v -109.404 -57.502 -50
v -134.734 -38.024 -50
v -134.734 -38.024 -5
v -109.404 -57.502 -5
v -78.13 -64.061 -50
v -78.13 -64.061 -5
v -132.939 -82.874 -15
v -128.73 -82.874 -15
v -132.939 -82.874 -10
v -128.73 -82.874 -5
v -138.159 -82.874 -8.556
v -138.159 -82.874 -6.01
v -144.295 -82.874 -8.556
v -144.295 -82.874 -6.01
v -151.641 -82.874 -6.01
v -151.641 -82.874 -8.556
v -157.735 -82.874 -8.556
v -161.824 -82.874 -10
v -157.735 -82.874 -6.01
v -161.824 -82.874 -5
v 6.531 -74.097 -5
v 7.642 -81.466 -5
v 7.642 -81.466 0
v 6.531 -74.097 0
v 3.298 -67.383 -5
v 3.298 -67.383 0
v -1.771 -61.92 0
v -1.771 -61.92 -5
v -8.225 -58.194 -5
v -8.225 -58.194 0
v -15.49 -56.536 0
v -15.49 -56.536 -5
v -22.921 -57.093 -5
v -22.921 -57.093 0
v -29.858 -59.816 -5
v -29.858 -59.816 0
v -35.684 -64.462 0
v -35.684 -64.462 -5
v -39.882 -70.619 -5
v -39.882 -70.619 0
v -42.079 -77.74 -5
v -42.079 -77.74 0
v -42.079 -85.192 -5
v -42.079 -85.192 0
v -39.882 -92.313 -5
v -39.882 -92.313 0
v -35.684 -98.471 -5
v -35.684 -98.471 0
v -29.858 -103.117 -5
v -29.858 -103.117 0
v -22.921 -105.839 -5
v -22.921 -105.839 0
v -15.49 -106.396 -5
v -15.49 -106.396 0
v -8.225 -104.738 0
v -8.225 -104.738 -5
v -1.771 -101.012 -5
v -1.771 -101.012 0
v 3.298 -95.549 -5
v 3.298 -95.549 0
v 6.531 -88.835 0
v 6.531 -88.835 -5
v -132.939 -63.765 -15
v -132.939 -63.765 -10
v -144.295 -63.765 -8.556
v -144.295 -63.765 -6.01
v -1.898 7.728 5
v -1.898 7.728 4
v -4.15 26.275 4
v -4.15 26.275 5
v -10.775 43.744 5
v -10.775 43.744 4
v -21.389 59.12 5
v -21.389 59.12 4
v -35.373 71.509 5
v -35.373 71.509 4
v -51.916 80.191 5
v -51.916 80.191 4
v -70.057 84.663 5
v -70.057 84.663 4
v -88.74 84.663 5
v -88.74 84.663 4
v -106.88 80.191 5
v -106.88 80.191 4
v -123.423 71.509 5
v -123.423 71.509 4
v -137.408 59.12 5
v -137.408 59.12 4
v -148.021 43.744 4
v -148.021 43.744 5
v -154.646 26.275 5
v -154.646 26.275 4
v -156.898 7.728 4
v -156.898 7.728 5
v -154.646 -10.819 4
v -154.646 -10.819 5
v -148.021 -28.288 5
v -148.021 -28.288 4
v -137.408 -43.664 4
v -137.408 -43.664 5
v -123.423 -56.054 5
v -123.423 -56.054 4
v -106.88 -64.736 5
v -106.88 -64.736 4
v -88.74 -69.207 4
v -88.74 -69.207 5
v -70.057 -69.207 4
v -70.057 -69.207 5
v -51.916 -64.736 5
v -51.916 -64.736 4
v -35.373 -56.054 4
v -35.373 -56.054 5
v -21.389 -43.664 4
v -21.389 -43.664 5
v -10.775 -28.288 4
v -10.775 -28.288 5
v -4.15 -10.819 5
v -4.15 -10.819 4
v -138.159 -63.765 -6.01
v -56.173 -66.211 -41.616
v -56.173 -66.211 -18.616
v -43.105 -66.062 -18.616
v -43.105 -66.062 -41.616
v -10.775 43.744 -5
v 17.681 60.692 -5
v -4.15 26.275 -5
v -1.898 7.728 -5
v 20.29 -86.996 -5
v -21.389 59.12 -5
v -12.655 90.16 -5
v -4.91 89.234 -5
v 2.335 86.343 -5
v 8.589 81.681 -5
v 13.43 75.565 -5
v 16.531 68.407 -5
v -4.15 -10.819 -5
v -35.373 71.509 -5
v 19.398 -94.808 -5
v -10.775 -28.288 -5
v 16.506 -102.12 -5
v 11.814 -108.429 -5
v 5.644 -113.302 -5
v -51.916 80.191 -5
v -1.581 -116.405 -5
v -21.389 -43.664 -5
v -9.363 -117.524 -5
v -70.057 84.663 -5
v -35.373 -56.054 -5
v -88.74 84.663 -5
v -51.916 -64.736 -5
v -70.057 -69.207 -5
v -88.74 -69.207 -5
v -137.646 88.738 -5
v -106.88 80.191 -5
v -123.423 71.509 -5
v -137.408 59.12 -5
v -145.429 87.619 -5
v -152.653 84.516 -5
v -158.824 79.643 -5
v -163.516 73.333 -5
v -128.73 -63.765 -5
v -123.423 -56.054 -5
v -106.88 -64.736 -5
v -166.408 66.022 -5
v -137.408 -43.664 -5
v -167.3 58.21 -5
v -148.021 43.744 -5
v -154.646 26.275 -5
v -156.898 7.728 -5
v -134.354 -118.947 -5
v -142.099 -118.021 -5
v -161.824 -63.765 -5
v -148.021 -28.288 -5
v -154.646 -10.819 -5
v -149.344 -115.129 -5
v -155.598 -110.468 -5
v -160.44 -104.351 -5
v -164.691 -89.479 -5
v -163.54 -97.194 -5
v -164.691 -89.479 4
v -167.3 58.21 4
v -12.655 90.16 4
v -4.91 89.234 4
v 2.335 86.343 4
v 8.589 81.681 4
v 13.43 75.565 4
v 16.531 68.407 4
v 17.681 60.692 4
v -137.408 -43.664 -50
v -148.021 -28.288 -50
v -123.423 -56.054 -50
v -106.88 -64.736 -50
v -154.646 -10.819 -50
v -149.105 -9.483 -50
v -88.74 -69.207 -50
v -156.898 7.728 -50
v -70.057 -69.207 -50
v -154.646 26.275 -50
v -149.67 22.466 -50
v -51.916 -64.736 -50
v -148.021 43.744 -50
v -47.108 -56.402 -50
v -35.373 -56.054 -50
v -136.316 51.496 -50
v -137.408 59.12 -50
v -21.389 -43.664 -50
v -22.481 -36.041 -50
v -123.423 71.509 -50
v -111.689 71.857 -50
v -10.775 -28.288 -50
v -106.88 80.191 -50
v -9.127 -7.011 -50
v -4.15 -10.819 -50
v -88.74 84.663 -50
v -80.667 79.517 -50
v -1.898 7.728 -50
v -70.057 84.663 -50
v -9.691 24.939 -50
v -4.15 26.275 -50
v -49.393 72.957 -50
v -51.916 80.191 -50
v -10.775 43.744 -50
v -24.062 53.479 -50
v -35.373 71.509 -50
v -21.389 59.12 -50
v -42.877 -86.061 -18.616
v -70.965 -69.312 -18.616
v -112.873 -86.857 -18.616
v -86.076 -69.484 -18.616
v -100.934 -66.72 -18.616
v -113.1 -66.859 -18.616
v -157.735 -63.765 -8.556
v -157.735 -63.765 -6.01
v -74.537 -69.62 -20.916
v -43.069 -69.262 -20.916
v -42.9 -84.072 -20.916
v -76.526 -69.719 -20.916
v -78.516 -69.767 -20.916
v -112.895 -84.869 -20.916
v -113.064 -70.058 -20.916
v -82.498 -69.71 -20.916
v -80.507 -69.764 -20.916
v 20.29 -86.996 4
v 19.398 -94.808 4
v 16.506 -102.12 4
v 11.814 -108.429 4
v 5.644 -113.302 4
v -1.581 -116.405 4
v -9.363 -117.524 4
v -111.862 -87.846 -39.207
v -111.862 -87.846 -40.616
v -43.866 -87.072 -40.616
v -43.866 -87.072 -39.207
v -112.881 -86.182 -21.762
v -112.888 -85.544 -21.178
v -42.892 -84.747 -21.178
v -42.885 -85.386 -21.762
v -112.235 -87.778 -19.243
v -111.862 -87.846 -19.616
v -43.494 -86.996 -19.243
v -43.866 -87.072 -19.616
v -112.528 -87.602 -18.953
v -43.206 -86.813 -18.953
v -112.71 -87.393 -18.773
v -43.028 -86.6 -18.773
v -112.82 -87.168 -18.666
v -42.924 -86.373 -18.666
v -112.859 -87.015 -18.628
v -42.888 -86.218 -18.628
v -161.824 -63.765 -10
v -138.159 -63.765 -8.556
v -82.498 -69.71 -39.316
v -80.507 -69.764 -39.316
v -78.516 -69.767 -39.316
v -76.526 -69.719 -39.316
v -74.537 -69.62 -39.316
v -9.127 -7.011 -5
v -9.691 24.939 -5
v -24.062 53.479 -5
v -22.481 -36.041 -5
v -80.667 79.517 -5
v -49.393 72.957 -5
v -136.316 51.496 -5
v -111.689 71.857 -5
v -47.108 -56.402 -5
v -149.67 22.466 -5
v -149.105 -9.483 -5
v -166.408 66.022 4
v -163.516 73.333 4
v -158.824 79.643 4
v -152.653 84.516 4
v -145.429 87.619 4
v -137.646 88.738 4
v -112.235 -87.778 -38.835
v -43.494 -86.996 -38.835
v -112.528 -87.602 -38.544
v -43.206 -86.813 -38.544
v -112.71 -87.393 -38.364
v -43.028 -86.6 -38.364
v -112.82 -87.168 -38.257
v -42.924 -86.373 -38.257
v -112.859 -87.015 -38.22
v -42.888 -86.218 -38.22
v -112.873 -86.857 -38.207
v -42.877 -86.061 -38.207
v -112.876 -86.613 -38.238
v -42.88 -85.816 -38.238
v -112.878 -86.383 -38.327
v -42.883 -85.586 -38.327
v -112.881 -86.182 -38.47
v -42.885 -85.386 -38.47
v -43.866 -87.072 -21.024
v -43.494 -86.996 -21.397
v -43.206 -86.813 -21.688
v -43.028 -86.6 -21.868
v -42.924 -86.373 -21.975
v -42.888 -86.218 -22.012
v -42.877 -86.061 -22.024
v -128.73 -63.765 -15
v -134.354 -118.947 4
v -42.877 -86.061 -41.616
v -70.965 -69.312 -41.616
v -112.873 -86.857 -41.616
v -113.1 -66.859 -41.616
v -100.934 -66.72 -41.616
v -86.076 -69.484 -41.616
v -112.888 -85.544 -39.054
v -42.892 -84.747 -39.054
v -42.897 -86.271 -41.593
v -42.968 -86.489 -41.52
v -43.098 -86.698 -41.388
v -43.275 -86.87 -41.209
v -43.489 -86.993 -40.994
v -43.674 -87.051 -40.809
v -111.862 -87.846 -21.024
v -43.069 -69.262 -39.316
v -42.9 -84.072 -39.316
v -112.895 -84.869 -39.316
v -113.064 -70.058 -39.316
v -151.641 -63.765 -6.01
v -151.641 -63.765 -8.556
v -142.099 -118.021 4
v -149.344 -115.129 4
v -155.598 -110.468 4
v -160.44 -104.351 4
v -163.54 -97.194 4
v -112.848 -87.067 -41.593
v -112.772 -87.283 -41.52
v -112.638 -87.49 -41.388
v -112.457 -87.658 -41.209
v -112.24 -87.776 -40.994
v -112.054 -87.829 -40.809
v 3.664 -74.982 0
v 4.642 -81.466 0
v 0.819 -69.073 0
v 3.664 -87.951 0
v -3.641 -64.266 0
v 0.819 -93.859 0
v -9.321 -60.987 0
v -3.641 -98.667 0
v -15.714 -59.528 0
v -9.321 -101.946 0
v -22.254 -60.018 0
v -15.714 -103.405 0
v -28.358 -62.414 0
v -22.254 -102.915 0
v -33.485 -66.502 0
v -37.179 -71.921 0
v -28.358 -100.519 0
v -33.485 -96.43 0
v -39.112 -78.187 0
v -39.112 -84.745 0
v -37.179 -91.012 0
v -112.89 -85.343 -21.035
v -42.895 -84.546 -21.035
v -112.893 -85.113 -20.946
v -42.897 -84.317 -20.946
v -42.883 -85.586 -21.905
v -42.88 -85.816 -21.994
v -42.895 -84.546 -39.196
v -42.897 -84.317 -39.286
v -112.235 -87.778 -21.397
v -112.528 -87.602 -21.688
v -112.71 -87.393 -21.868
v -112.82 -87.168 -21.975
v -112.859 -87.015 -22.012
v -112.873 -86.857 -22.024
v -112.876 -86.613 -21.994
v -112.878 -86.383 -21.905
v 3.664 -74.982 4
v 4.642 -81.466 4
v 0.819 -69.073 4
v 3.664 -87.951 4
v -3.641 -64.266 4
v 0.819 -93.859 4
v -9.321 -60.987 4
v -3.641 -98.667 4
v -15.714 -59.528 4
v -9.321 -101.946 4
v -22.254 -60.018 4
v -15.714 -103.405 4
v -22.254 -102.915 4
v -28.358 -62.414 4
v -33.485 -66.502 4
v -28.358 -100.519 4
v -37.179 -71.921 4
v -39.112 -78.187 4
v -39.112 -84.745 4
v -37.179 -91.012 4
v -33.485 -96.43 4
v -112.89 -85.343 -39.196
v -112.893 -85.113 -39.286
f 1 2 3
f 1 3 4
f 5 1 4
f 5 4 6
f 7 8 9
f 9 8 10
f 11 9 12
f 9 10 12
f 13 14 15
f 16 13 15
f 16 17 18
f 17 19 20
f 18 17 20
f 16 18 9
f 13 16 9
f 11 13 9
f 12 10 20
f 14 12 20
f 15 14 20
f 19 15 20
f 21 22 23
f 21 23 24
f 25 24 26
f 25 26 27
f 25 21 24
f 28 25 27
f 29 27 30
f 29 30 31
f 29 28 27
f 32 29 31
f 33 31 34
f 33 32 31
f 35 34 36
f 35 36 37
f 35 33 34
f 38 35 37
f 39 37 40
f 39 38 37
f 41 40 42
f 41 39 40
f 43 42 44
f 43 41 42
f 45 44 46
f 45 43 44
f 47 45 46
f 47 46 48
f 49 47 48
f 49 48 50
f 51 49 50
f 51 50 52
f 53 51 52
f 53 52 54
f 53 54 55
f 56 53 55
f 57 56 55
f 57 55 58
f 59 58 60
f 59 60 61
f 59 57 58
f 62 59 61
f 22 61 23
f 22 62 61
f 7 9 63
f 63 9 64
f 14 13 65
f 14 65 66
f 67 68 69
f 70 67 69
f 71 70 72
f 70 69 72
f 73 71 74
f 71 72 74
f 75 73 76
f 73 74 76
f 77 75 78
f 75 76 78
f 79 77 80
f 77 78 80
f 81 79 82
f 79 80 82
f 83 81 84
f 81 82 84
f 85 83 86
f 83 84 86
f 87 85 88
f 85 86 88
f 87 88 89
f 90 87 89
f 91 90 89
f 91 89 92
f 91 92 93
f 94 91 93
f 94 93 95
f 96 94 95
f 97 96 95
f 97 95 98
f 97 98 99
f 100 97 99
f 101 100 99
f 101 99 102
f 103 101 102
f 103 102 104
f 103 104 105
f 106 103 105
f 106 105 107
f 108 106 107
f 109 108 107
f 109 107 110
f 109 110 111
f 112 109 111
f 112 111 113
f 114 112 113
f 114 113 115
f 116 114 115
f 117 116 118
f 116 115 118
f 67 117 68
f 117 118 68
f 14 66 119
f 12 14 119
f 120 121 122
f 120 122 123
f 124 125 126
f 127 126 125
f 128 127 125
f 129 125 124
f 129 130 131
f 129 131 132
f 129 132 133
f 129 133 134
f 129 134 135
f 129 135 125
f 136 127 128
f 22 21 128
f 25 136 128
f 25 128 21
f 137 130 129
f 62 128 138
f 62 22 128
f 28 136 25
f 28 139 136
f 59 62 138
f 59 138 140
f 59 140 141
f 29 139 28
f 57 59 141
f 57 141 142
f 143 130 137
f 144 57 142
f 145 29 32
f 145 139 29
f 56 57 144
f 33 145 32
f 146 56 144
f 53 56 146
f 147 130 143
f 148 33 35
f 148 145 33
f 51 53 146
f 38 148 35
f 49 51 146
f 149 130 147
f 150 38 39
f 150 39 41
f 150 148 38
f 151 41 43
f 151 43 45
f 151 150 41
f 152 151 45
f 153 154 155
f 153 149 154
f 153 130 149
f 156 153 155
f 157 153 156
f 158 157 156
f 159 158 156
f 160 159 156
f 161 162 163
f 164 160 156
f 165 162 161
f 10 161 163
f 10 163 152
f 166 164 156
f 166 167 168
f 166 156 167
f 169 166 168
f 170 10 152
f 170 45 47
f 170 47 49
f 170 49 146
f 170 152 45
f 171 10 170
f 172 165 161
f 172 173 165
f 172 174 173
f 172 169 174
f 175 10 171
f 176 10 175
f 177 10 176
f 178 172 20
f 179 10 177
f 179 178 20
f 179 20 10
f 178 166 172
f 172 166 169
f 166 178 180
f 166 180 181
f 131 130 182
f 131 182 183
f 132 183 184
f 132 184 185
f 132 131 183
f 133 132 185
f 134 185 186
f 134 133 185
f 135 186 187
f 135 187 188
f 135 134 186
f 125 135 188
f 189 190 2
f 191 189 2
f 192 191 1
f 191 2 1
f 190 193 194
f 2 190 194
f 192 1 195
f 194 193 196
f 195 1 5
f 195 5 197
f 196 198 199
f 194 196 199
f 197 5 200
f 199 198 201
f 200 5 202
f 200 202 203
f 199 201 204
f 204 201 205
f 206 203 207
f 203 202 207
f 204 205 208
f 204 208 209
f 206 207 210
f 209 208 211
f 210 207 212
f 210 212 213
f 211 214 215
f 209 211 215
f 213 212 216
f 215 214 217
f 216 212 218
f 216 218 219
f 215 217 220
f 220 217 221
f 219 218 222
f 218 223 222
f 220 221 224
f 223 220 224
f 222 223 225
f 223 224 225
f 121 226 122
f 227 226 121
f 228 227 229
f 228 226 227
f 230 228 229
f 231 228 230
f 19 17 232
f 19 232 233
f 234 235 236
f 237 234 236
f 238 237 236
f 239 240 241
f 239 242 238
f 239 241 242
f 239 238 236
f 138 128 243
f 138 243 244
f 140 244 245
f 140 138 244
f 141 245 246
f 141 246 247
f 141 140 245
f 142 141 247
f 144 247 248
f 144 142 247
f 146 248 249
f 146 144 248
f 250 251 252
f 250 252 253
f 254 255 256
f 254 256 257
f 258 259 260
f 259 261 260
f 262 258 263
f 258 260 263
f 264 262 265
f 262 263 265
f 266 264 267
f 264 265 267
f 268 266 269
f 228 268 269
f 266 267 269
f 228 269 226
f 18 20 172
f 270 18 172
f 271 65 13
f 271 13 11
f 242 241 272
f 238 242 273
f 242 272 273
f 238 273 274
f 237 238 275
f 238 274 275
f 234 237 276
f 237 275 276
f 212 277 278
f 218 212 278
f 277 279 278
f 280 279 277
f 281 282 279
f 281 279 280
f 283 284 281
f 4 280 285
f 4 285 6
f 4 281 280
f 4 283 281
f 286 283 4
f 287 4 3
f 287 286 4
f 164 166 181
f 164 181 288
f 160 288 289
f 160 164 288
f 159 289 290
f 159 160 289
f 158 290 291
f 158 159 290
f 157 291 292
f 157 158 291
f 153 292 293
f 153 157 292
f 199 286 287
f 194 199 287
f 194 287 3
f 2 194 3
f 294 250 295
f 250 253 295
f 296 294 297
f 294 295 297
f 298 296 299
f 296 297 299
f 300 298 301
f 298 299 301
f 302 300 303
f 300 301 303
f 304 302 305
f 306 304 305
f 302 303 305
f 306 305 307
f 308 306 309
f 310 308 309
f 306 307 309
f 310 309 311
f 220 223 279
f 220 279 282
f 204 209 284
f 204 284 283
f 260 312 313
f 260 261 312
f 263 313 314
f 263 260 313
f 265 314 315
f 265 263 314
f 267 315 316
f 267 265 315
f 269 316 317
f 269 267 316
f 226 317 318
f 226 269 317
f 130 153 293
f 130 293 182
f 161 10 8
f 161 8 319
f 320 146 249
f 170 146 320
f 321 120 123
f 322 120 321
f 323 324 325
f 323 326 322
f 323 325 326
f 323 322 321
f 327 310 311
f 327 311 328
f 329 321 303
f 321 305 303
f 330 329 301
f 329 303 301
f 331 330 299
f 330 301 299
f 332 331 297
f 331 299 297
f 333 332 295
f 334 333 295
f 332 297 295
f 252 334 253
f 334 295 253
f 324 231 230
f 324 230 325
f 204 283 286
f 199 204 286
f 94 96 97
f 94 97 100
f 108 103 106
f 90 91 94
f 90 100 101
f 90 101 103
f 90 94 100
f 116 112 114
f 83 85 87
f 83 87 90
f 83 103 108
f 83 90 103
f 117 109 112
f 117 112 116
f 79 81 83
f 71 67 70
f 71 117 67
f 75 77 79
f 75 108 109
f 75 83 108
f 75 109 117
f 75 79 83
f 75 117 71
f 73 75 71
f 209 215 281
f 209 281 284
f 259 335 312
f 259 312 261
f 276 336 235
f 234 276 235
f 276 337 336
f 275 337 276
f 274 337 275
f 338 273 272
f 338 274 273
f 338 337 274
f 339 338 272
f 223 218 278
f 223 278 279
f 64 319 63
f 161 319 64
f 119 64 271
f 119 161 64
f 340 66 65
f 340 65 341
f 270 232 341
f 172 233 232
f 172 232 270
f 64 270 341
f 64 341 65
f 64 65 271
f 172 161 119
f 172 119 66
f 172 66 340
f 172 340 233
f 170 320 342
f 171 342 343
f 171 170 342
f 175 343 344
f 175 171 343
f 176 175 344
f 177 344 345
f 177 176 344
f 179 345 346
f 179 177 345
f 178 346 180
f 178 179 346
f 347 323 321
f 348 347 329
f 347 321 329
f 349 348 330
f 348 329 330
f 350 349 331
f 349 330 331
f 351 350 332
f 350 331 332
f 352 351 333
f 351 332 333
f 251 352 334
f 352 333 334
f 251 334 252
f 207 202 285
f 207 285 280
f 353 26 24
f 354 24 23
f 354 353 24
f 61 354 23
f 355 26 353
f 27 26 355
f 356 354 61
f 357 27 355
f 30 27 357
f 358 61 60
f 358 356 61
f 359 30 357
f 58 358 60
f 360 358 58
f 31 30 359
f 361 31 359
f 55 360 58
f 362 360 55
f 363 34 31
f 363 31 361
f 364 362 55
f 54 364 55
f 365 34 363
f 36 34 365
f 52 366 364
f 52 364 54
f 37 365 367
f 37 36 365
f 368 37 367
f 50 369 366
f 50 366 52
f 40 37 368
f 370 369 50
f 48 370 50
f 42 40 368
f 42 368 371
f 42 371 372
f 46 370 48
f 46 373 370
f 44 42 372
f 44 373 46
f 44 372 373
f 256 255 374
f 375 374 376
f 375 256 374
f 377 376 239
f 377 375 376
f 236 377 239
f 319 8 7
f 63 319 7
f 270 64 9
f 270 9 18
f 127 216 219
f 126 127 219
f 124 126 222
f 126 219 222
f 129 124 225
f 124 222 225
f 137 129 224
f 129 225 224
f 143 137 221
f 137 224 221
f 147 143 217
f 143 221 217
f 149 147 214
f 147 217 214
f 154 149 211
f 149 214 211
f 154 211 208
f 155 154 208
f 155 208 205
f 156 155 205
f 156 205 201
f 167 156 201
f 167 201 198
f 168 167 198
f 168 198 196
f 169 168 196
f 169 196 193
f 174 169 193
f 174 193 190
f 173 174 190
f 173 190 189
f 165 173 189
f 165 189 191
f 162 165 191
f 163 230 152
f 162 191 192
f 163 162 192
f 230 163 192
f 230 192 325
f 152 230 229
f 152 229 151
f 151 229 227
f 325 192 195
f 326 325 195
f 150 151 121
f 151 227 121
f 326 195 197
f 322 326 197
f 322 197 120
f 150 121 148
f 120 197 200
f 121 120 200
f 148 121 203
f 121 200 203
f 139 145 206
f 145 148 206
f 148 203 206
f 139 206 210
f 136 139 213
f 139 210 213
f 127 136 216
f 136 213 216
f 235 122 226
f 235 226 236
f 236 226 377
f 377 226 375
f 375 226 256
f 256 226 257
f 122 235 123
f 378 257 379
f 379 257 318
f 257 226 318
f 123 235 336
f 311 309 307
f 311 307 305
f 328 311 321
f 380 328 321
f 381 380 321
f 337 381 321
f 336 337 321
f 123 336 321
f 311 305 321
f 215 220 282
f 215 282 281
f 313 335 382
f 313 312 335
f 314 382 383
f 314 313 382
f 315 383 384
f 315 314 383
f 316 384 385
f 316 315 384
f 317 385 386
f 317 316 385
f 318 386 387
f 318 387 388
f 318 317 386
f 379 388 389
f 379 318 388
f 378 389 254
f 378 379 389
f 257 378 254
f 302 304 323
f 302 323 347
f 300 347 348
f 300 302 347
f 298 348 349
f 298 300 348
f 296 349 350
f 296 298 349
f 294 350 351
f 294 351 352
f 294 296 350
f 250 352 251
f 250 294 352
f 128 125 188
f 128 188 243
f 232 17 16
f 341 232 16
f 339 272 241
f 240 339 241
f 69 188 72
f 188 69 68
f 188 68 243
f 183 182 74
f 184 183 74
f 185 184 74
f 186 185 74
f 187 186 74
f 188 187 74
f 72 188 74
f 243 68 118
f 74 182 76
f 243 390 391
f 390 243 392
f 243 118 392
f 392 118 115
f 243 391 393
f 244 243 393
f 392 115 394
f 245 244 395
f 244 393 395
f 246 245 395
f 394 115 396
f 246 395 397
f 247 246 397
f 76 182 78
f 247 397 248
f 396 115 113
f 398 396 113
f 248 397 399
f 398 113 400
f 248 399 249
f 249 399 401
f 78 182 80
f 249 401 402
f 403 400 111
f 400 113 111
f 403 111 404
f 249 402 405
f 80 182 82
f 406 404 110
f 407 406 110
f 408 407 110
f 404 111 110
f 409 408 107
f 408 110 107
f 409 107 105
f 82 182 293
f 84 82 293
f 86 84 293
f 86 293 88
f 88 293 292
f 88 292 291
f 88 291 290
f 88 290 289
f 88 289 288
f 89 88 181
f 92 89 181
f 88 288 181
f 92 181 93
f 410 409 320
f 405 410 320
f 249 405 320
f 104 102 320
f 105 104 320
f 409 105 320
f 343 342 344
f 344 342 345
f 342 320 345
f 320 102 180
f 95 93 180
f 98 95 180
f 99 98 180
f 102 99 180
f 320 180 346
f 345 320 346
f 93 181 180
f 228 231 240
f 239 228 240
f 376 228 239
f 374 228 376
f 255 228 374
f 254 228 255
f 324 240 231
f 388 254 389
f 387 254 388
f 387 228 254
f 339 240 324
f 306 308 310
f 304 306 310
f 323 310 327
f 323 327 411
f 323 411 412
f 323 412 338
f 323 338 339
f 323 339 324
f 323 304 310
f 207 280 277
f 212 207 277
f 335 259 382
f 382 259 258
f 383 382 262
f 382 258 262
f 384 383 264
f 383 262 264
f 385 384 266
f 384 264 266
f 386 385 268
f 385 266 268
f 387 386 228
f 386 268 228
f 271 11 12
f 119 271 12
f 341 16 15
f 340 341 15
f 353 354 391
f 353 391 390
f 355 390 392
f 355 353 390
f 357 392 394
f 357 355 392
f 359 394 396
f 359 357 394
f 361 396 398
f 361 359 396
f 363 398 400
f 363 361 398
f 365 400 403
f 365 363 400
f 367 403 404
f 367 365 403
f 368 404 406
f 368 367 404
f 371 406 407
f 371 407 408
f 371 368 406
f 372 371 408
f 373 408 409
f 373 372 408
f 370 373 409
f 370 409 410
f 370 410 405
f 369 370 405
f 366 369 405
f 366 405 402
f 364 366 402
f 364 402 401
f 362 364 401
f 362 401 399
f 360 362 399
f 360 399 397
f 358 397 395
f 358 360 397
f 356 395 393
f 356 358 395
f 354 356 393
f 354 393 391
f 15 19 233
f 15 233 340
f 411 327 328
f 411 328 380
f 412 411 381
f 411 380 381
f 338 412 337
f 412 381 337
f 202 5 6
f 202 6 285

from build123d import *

# Parameters (mm, degrees)
SKETCH1_R                 = 77.5
SKETCH1_R_2               = 22
BOSS_EXTRUDE1_DEPTH       = 4
BOSS_EXTRUDE2_START       = -5
SKETCH1_4_R               = 25
BOSS_EXTRUDE2_DEPTH       = 5
BOSS_EXTRUDE5_START       = -50
SKETCH1_7_R               = 77.5
BOSS_EXTRUDE5_DEPTH       = 50
BOSS_EXTRUDE11_DEPTH      = 35
BOSS_EXTRUDE11_DEPTH_BACK = 35
FILLET6_R                 = 1
SKETCH1_8_R               = 77.5
BOSS_EXTRUDE12_DEPTH      = 5
SKETCH9_W                 = 28.884835104
SKETCH9_H                 = 19.109753223
BOSS_EXTRUDE15_DEPTH      = 5
SKETCH10_W                = 6.135894163
SKETCH10_H                = 2.546187374
SKETCH10_W_2              = 6.094153386
CUT_EXTRUDE1_DEPTH        = 19.109753223
SKETCH9_9_W               = 4.209300424
SKETCH9_9_H               = 19.109753223
BOSS_EXTRUDE16_DEPTH      = 10


with BuildPart() as part:
    # Sketch1 → Boss-Extrude1 (new body)
    with BuildSketch(Plane(origin=(-55.630480005, 66.15900607, 0), x_dir=(0.499999999999998, 0.8660254037844398, 0), z_dir=(0, 0, 1))):
        with BuildLine():
            Line((-189.316298544, 16.630324375), (-62.719050458, 92.734061587))
            ThreePointArc((-62.719050458, 92.734061587), (-39.919544136, 96.109788868), (-21.454102902, 82.317018907))
            Line((-21.454102902, 82.317018907), (42.273246416, -25.216830667))
            ThreePointArc((42.273246416, -25.216830667), (45.552356682, -47.854466687), (31.921457021, -66.223290906))
            Line((31.921457021, -66.223290906), (-94.675791065, -142.327028118))
            ThreePointArc((-94.675791065, -142.327028118), (-117.475297387, -145.7027554), (-135.940738621, -131.909985438))
            Line((-135.940738621, -131.909985438), (-199.668087939, -24.376135865))
            ThreePointArc((-199.668087939, -24.376135865), (-202.947198205, -1.738499844), (-189.316298544, 16.630324375))
        make_face()
        with Locations(Location((-62.487009575, -8.6321901, 0), (0, 0, 300))):
            Circle(SKETCH1_R, mode=Mode.SUBTRACT)
        with Locations(Location((-108.711062401, -106.957491085, 0), (0, 0, 300))):
            Circle(SKETCH1_R_2, mode=Mode.SUBTRACT)
    extrude(amount=BOSS_EXTRUDE1_DEPTH)

    # Sketch1_4 → Boss-Extrude2 (add)
    with BuildSketch(Plane(origin=(-55.630480005, 66.15900607, 0), x_dir=(0.499999999999998, 0.8660254037844398, 0), z_dir=(0, 0, 1)).offset(BOSS_EXTRUDE2_START)):
        with BuildLine():
            Line((-189.316298544, 16.630324375), (-62.719050458, 92.734061587))
            ThreePointArc((-62.719050458, 92.734061587), (-39.919544136, 96.109788868), (-21.454102902, 82.317018907))
            Line((-21.454102902, 82.317018907), (42.273246416, -25.216830667))
            ThreePointArc((42.273246416, -25.216830667), (45.552356682, -47.854466687), (31.921457021, -66.223290906))
            Line((31.921457021, -66.223290906), (-94.675791065, -142.327028118))
            ThreePointArc((-94.675791065, -142.327028118), (-117.475297387, -145.7027554), (-135.940738621, -131.909985438))
            Line((-135.940738621, -131.909985438), (-199.668087939, -24.376135865))
            ThreePointArc((-199.668087939, -24.376135865), (-202.947198205, -1.738499844), (-189.316298544, 16.630324375))
        make_face()
        with Locations(Location((-108.711062401, -106.957491085, 0), (0, 0, 300))):
            Circle(SKETCH1_4_R, mode=Mode.SUBTRACT)
    extrude(amount=BOSS_EXTRUDE2_DEPTH)

    # Sketch1_7 → Boss-Extrude5 (add)
    with BuildSketch(Plane(origin=(-55.630480005, 66.15900607, 0), x_dir=(0.499999999999998, 0.8660254037844398, 0), z_dir=(0, 0, 1)).offset(BOSS_EXTRUDE5_START)):
        with Locations(Location((-62.487009575, -8.6321901, 0), (0, 0, 300))):
            Circle(SKETCH1_7_R)
        Polygon((-84.859101961, 59.5935777), (-112.245619562, 43.13021558), (-129.776834206, 16.41467419), (-133.980473825, -15.261705851), (-124.023956041, -45.625028993), (-101.879291307, -68.661466704), (-71.932502062, -79.808369973), (-40.114917188, -76.8579579), (-12.728399587, -60.39459578), (4.802815056, -33.679054391), (9.006454676, -2.002674349), (-0.950063109, 28.360648792), (-23.094727842, 51.397086504), (-53.041517088, 62.543989773), align=None, mode=Mode.SUBTRACT)
    extrude(amount=BOSS_EXTRUDE5_DEPTH)

    # Sketch8 → Boss-Extrude11 (add, two sides: drawn at the far end of the back side and taken through both)
    with BuildSketch(Plane(origin=(-78.84892316, -0.897416974, 0), x_dir=(0, 0, 1), z_dir=(0.9999352373159692, 0.01138073696455021, 0)).offset(-BOSS_EXTRUDE11_DEPTH_BACK)):
        Polygon((-23.295016777, 86.56703586), (-18.615876211, 86.56703586), (-18.615875095, 65.56703586), (-41.615875095, 65.56703586), (-41.615876211, 86.56703586), (-36.936735645, 86.56703586), (-39.315876073, 83.96703586), (-39.315875265, 68.76703586), (-20.915875265, 68.76703586), (-20.915876073, 83.96703586), align=None)
    extrude(amount=BOSS_EXTRUDE11_DEPTH + BOSS_EXTRUDE11_DEPTH_BACK)

    # Fillet6
    fillet6_edges = [part.edges().sort_by_distance(p)[0] for p in [
        (-77.863726496, -87.45884652, -23.295016777),
        (-42.86599319, -87.060520726, -20.955446494),
        (-77.863726496, -87.45884652, -18.615876211),
        (-77.863726496, -87.45884652, -41.615876211),
        (-42.86599319, -87.060520726, -39.276305928),
        (-77.863726496, -87.45884652, -36.936735645),
        (-77.893316412, -84.859014903, -39.315876073),
        (-77.893316412, -84.859014903, -20.915876073),
        (-112.861459802, -87.857172313, -20.955446494),
        (-112.861459802, -87.857172313, -39.276305928),
    ]]
    fillet(fillet6_edges, radius=FILLET6_R)

    # Sketch1_8 → Boss-Extrude12 (add)
    # profile 1 of 2: a face of its own
    with BuildSketch(Plane(origin=(-55.630480005, 66.15900607, 0), x_dir=(0.499999999999998, 0.8660254037844398, 0), z_dir=(0, 0, 1))):
        with Locations(Location((-62.487009575, -8.6321901, 0), (0, 0, 300))):
            Circle(SKETCH1_8_R)
        Polygon((-53.041517088, 62.543989773), (-84.859101961, 59.5935777), (-112.245619562, 43.13021558), (-129.776834206, 16.41467419), (-133.980473825, -15.261705851), (-124.023956041, -45.625028993), (-101.879291307, -68.661466704), (-71.932502062, -79.808369973), (-40.114917188, -76.8579579), (-12.728399587, -60.39459578), (4.802815056, -33.679054391), (9.006454676, -2.002674349), (-0.950063109, 28.360648792), (-23.094727842, 51.397086504), align=None, mode=Mode.SUBTRACT)
    # profile 2 of 2: a face of its own
    with BuildSketch(Plane(origin=(-55.630480005, 66.15900607, 0), x_dir=(0.499999999999998, 0.8660254037844398, 0), z_dir=(0, 0, 1))):
        Polygon((-23.094727842, 51.397086504), (-53.041517088, 62.543989773), (-84.859101961, 59.5935777), (-112.245619562, 43.13021558), (-129.776834206, 16.41467419), (-133.980473825, -15.261705851), (-124.023956041, -45.625028993), (-101.879291307, -68.661466704), (-71.932502062, -79.808369973), (-40.114917188, -76.8579579), (-12.728399587, -60.39459578), (4.802815056, -33.679054391), (9.006454676, -2.002674349), (-0.950063109, 28.360648792), align=None)
    extrude(amount=BOSS_EXTRUDE12_DEPTH)

    # Sketch9 → Boss-Extrude15 (add)
    with BuildSketch(Plane(origin=(0, 0, -5), x_dir=(-1, 0, 0), z_dir=(0, 0, -1))):
        with Locations((147.381235027, -73.319519351)):
            Rectangle(SKETCH9_W, SKETCH9_H)
    extrude(amount=BOSS_EXTRUDE15_DEPTH)

    # Sketch10 → Cut-Extrude1 (cut)
    with BuildSketch(Plane.XZ.offset(82.874395962)):
        with Locations((-141.22663524, -7.28335185)):
            Rectangle(SKETCH10_W, SKETCH10_H)
        with Locations((-154.687790802, -7.28335185)):
            Rectangle(SKETCH10_W_2, SKETCH10_H)
    extrude(amount=-CUT_EXTRUDE1_DEPTH, mode=Mode.SUBTRACT)

    # Sketch9_9 → Boss-Extrude16 (add)
    with BuildSketch(Plane(origin=(0, 0, -5), x_dir=(-1, 0, 0), z_dir=(0, 0, -1))):
        with Locations((130.834167263, -73.319519351)):
            Rectangle(SKETCH9_9_W, SKETCH9_9_H)
    extrude(amount=BOSS_EXTRUDE16_DEPTH)


solid = part.part
